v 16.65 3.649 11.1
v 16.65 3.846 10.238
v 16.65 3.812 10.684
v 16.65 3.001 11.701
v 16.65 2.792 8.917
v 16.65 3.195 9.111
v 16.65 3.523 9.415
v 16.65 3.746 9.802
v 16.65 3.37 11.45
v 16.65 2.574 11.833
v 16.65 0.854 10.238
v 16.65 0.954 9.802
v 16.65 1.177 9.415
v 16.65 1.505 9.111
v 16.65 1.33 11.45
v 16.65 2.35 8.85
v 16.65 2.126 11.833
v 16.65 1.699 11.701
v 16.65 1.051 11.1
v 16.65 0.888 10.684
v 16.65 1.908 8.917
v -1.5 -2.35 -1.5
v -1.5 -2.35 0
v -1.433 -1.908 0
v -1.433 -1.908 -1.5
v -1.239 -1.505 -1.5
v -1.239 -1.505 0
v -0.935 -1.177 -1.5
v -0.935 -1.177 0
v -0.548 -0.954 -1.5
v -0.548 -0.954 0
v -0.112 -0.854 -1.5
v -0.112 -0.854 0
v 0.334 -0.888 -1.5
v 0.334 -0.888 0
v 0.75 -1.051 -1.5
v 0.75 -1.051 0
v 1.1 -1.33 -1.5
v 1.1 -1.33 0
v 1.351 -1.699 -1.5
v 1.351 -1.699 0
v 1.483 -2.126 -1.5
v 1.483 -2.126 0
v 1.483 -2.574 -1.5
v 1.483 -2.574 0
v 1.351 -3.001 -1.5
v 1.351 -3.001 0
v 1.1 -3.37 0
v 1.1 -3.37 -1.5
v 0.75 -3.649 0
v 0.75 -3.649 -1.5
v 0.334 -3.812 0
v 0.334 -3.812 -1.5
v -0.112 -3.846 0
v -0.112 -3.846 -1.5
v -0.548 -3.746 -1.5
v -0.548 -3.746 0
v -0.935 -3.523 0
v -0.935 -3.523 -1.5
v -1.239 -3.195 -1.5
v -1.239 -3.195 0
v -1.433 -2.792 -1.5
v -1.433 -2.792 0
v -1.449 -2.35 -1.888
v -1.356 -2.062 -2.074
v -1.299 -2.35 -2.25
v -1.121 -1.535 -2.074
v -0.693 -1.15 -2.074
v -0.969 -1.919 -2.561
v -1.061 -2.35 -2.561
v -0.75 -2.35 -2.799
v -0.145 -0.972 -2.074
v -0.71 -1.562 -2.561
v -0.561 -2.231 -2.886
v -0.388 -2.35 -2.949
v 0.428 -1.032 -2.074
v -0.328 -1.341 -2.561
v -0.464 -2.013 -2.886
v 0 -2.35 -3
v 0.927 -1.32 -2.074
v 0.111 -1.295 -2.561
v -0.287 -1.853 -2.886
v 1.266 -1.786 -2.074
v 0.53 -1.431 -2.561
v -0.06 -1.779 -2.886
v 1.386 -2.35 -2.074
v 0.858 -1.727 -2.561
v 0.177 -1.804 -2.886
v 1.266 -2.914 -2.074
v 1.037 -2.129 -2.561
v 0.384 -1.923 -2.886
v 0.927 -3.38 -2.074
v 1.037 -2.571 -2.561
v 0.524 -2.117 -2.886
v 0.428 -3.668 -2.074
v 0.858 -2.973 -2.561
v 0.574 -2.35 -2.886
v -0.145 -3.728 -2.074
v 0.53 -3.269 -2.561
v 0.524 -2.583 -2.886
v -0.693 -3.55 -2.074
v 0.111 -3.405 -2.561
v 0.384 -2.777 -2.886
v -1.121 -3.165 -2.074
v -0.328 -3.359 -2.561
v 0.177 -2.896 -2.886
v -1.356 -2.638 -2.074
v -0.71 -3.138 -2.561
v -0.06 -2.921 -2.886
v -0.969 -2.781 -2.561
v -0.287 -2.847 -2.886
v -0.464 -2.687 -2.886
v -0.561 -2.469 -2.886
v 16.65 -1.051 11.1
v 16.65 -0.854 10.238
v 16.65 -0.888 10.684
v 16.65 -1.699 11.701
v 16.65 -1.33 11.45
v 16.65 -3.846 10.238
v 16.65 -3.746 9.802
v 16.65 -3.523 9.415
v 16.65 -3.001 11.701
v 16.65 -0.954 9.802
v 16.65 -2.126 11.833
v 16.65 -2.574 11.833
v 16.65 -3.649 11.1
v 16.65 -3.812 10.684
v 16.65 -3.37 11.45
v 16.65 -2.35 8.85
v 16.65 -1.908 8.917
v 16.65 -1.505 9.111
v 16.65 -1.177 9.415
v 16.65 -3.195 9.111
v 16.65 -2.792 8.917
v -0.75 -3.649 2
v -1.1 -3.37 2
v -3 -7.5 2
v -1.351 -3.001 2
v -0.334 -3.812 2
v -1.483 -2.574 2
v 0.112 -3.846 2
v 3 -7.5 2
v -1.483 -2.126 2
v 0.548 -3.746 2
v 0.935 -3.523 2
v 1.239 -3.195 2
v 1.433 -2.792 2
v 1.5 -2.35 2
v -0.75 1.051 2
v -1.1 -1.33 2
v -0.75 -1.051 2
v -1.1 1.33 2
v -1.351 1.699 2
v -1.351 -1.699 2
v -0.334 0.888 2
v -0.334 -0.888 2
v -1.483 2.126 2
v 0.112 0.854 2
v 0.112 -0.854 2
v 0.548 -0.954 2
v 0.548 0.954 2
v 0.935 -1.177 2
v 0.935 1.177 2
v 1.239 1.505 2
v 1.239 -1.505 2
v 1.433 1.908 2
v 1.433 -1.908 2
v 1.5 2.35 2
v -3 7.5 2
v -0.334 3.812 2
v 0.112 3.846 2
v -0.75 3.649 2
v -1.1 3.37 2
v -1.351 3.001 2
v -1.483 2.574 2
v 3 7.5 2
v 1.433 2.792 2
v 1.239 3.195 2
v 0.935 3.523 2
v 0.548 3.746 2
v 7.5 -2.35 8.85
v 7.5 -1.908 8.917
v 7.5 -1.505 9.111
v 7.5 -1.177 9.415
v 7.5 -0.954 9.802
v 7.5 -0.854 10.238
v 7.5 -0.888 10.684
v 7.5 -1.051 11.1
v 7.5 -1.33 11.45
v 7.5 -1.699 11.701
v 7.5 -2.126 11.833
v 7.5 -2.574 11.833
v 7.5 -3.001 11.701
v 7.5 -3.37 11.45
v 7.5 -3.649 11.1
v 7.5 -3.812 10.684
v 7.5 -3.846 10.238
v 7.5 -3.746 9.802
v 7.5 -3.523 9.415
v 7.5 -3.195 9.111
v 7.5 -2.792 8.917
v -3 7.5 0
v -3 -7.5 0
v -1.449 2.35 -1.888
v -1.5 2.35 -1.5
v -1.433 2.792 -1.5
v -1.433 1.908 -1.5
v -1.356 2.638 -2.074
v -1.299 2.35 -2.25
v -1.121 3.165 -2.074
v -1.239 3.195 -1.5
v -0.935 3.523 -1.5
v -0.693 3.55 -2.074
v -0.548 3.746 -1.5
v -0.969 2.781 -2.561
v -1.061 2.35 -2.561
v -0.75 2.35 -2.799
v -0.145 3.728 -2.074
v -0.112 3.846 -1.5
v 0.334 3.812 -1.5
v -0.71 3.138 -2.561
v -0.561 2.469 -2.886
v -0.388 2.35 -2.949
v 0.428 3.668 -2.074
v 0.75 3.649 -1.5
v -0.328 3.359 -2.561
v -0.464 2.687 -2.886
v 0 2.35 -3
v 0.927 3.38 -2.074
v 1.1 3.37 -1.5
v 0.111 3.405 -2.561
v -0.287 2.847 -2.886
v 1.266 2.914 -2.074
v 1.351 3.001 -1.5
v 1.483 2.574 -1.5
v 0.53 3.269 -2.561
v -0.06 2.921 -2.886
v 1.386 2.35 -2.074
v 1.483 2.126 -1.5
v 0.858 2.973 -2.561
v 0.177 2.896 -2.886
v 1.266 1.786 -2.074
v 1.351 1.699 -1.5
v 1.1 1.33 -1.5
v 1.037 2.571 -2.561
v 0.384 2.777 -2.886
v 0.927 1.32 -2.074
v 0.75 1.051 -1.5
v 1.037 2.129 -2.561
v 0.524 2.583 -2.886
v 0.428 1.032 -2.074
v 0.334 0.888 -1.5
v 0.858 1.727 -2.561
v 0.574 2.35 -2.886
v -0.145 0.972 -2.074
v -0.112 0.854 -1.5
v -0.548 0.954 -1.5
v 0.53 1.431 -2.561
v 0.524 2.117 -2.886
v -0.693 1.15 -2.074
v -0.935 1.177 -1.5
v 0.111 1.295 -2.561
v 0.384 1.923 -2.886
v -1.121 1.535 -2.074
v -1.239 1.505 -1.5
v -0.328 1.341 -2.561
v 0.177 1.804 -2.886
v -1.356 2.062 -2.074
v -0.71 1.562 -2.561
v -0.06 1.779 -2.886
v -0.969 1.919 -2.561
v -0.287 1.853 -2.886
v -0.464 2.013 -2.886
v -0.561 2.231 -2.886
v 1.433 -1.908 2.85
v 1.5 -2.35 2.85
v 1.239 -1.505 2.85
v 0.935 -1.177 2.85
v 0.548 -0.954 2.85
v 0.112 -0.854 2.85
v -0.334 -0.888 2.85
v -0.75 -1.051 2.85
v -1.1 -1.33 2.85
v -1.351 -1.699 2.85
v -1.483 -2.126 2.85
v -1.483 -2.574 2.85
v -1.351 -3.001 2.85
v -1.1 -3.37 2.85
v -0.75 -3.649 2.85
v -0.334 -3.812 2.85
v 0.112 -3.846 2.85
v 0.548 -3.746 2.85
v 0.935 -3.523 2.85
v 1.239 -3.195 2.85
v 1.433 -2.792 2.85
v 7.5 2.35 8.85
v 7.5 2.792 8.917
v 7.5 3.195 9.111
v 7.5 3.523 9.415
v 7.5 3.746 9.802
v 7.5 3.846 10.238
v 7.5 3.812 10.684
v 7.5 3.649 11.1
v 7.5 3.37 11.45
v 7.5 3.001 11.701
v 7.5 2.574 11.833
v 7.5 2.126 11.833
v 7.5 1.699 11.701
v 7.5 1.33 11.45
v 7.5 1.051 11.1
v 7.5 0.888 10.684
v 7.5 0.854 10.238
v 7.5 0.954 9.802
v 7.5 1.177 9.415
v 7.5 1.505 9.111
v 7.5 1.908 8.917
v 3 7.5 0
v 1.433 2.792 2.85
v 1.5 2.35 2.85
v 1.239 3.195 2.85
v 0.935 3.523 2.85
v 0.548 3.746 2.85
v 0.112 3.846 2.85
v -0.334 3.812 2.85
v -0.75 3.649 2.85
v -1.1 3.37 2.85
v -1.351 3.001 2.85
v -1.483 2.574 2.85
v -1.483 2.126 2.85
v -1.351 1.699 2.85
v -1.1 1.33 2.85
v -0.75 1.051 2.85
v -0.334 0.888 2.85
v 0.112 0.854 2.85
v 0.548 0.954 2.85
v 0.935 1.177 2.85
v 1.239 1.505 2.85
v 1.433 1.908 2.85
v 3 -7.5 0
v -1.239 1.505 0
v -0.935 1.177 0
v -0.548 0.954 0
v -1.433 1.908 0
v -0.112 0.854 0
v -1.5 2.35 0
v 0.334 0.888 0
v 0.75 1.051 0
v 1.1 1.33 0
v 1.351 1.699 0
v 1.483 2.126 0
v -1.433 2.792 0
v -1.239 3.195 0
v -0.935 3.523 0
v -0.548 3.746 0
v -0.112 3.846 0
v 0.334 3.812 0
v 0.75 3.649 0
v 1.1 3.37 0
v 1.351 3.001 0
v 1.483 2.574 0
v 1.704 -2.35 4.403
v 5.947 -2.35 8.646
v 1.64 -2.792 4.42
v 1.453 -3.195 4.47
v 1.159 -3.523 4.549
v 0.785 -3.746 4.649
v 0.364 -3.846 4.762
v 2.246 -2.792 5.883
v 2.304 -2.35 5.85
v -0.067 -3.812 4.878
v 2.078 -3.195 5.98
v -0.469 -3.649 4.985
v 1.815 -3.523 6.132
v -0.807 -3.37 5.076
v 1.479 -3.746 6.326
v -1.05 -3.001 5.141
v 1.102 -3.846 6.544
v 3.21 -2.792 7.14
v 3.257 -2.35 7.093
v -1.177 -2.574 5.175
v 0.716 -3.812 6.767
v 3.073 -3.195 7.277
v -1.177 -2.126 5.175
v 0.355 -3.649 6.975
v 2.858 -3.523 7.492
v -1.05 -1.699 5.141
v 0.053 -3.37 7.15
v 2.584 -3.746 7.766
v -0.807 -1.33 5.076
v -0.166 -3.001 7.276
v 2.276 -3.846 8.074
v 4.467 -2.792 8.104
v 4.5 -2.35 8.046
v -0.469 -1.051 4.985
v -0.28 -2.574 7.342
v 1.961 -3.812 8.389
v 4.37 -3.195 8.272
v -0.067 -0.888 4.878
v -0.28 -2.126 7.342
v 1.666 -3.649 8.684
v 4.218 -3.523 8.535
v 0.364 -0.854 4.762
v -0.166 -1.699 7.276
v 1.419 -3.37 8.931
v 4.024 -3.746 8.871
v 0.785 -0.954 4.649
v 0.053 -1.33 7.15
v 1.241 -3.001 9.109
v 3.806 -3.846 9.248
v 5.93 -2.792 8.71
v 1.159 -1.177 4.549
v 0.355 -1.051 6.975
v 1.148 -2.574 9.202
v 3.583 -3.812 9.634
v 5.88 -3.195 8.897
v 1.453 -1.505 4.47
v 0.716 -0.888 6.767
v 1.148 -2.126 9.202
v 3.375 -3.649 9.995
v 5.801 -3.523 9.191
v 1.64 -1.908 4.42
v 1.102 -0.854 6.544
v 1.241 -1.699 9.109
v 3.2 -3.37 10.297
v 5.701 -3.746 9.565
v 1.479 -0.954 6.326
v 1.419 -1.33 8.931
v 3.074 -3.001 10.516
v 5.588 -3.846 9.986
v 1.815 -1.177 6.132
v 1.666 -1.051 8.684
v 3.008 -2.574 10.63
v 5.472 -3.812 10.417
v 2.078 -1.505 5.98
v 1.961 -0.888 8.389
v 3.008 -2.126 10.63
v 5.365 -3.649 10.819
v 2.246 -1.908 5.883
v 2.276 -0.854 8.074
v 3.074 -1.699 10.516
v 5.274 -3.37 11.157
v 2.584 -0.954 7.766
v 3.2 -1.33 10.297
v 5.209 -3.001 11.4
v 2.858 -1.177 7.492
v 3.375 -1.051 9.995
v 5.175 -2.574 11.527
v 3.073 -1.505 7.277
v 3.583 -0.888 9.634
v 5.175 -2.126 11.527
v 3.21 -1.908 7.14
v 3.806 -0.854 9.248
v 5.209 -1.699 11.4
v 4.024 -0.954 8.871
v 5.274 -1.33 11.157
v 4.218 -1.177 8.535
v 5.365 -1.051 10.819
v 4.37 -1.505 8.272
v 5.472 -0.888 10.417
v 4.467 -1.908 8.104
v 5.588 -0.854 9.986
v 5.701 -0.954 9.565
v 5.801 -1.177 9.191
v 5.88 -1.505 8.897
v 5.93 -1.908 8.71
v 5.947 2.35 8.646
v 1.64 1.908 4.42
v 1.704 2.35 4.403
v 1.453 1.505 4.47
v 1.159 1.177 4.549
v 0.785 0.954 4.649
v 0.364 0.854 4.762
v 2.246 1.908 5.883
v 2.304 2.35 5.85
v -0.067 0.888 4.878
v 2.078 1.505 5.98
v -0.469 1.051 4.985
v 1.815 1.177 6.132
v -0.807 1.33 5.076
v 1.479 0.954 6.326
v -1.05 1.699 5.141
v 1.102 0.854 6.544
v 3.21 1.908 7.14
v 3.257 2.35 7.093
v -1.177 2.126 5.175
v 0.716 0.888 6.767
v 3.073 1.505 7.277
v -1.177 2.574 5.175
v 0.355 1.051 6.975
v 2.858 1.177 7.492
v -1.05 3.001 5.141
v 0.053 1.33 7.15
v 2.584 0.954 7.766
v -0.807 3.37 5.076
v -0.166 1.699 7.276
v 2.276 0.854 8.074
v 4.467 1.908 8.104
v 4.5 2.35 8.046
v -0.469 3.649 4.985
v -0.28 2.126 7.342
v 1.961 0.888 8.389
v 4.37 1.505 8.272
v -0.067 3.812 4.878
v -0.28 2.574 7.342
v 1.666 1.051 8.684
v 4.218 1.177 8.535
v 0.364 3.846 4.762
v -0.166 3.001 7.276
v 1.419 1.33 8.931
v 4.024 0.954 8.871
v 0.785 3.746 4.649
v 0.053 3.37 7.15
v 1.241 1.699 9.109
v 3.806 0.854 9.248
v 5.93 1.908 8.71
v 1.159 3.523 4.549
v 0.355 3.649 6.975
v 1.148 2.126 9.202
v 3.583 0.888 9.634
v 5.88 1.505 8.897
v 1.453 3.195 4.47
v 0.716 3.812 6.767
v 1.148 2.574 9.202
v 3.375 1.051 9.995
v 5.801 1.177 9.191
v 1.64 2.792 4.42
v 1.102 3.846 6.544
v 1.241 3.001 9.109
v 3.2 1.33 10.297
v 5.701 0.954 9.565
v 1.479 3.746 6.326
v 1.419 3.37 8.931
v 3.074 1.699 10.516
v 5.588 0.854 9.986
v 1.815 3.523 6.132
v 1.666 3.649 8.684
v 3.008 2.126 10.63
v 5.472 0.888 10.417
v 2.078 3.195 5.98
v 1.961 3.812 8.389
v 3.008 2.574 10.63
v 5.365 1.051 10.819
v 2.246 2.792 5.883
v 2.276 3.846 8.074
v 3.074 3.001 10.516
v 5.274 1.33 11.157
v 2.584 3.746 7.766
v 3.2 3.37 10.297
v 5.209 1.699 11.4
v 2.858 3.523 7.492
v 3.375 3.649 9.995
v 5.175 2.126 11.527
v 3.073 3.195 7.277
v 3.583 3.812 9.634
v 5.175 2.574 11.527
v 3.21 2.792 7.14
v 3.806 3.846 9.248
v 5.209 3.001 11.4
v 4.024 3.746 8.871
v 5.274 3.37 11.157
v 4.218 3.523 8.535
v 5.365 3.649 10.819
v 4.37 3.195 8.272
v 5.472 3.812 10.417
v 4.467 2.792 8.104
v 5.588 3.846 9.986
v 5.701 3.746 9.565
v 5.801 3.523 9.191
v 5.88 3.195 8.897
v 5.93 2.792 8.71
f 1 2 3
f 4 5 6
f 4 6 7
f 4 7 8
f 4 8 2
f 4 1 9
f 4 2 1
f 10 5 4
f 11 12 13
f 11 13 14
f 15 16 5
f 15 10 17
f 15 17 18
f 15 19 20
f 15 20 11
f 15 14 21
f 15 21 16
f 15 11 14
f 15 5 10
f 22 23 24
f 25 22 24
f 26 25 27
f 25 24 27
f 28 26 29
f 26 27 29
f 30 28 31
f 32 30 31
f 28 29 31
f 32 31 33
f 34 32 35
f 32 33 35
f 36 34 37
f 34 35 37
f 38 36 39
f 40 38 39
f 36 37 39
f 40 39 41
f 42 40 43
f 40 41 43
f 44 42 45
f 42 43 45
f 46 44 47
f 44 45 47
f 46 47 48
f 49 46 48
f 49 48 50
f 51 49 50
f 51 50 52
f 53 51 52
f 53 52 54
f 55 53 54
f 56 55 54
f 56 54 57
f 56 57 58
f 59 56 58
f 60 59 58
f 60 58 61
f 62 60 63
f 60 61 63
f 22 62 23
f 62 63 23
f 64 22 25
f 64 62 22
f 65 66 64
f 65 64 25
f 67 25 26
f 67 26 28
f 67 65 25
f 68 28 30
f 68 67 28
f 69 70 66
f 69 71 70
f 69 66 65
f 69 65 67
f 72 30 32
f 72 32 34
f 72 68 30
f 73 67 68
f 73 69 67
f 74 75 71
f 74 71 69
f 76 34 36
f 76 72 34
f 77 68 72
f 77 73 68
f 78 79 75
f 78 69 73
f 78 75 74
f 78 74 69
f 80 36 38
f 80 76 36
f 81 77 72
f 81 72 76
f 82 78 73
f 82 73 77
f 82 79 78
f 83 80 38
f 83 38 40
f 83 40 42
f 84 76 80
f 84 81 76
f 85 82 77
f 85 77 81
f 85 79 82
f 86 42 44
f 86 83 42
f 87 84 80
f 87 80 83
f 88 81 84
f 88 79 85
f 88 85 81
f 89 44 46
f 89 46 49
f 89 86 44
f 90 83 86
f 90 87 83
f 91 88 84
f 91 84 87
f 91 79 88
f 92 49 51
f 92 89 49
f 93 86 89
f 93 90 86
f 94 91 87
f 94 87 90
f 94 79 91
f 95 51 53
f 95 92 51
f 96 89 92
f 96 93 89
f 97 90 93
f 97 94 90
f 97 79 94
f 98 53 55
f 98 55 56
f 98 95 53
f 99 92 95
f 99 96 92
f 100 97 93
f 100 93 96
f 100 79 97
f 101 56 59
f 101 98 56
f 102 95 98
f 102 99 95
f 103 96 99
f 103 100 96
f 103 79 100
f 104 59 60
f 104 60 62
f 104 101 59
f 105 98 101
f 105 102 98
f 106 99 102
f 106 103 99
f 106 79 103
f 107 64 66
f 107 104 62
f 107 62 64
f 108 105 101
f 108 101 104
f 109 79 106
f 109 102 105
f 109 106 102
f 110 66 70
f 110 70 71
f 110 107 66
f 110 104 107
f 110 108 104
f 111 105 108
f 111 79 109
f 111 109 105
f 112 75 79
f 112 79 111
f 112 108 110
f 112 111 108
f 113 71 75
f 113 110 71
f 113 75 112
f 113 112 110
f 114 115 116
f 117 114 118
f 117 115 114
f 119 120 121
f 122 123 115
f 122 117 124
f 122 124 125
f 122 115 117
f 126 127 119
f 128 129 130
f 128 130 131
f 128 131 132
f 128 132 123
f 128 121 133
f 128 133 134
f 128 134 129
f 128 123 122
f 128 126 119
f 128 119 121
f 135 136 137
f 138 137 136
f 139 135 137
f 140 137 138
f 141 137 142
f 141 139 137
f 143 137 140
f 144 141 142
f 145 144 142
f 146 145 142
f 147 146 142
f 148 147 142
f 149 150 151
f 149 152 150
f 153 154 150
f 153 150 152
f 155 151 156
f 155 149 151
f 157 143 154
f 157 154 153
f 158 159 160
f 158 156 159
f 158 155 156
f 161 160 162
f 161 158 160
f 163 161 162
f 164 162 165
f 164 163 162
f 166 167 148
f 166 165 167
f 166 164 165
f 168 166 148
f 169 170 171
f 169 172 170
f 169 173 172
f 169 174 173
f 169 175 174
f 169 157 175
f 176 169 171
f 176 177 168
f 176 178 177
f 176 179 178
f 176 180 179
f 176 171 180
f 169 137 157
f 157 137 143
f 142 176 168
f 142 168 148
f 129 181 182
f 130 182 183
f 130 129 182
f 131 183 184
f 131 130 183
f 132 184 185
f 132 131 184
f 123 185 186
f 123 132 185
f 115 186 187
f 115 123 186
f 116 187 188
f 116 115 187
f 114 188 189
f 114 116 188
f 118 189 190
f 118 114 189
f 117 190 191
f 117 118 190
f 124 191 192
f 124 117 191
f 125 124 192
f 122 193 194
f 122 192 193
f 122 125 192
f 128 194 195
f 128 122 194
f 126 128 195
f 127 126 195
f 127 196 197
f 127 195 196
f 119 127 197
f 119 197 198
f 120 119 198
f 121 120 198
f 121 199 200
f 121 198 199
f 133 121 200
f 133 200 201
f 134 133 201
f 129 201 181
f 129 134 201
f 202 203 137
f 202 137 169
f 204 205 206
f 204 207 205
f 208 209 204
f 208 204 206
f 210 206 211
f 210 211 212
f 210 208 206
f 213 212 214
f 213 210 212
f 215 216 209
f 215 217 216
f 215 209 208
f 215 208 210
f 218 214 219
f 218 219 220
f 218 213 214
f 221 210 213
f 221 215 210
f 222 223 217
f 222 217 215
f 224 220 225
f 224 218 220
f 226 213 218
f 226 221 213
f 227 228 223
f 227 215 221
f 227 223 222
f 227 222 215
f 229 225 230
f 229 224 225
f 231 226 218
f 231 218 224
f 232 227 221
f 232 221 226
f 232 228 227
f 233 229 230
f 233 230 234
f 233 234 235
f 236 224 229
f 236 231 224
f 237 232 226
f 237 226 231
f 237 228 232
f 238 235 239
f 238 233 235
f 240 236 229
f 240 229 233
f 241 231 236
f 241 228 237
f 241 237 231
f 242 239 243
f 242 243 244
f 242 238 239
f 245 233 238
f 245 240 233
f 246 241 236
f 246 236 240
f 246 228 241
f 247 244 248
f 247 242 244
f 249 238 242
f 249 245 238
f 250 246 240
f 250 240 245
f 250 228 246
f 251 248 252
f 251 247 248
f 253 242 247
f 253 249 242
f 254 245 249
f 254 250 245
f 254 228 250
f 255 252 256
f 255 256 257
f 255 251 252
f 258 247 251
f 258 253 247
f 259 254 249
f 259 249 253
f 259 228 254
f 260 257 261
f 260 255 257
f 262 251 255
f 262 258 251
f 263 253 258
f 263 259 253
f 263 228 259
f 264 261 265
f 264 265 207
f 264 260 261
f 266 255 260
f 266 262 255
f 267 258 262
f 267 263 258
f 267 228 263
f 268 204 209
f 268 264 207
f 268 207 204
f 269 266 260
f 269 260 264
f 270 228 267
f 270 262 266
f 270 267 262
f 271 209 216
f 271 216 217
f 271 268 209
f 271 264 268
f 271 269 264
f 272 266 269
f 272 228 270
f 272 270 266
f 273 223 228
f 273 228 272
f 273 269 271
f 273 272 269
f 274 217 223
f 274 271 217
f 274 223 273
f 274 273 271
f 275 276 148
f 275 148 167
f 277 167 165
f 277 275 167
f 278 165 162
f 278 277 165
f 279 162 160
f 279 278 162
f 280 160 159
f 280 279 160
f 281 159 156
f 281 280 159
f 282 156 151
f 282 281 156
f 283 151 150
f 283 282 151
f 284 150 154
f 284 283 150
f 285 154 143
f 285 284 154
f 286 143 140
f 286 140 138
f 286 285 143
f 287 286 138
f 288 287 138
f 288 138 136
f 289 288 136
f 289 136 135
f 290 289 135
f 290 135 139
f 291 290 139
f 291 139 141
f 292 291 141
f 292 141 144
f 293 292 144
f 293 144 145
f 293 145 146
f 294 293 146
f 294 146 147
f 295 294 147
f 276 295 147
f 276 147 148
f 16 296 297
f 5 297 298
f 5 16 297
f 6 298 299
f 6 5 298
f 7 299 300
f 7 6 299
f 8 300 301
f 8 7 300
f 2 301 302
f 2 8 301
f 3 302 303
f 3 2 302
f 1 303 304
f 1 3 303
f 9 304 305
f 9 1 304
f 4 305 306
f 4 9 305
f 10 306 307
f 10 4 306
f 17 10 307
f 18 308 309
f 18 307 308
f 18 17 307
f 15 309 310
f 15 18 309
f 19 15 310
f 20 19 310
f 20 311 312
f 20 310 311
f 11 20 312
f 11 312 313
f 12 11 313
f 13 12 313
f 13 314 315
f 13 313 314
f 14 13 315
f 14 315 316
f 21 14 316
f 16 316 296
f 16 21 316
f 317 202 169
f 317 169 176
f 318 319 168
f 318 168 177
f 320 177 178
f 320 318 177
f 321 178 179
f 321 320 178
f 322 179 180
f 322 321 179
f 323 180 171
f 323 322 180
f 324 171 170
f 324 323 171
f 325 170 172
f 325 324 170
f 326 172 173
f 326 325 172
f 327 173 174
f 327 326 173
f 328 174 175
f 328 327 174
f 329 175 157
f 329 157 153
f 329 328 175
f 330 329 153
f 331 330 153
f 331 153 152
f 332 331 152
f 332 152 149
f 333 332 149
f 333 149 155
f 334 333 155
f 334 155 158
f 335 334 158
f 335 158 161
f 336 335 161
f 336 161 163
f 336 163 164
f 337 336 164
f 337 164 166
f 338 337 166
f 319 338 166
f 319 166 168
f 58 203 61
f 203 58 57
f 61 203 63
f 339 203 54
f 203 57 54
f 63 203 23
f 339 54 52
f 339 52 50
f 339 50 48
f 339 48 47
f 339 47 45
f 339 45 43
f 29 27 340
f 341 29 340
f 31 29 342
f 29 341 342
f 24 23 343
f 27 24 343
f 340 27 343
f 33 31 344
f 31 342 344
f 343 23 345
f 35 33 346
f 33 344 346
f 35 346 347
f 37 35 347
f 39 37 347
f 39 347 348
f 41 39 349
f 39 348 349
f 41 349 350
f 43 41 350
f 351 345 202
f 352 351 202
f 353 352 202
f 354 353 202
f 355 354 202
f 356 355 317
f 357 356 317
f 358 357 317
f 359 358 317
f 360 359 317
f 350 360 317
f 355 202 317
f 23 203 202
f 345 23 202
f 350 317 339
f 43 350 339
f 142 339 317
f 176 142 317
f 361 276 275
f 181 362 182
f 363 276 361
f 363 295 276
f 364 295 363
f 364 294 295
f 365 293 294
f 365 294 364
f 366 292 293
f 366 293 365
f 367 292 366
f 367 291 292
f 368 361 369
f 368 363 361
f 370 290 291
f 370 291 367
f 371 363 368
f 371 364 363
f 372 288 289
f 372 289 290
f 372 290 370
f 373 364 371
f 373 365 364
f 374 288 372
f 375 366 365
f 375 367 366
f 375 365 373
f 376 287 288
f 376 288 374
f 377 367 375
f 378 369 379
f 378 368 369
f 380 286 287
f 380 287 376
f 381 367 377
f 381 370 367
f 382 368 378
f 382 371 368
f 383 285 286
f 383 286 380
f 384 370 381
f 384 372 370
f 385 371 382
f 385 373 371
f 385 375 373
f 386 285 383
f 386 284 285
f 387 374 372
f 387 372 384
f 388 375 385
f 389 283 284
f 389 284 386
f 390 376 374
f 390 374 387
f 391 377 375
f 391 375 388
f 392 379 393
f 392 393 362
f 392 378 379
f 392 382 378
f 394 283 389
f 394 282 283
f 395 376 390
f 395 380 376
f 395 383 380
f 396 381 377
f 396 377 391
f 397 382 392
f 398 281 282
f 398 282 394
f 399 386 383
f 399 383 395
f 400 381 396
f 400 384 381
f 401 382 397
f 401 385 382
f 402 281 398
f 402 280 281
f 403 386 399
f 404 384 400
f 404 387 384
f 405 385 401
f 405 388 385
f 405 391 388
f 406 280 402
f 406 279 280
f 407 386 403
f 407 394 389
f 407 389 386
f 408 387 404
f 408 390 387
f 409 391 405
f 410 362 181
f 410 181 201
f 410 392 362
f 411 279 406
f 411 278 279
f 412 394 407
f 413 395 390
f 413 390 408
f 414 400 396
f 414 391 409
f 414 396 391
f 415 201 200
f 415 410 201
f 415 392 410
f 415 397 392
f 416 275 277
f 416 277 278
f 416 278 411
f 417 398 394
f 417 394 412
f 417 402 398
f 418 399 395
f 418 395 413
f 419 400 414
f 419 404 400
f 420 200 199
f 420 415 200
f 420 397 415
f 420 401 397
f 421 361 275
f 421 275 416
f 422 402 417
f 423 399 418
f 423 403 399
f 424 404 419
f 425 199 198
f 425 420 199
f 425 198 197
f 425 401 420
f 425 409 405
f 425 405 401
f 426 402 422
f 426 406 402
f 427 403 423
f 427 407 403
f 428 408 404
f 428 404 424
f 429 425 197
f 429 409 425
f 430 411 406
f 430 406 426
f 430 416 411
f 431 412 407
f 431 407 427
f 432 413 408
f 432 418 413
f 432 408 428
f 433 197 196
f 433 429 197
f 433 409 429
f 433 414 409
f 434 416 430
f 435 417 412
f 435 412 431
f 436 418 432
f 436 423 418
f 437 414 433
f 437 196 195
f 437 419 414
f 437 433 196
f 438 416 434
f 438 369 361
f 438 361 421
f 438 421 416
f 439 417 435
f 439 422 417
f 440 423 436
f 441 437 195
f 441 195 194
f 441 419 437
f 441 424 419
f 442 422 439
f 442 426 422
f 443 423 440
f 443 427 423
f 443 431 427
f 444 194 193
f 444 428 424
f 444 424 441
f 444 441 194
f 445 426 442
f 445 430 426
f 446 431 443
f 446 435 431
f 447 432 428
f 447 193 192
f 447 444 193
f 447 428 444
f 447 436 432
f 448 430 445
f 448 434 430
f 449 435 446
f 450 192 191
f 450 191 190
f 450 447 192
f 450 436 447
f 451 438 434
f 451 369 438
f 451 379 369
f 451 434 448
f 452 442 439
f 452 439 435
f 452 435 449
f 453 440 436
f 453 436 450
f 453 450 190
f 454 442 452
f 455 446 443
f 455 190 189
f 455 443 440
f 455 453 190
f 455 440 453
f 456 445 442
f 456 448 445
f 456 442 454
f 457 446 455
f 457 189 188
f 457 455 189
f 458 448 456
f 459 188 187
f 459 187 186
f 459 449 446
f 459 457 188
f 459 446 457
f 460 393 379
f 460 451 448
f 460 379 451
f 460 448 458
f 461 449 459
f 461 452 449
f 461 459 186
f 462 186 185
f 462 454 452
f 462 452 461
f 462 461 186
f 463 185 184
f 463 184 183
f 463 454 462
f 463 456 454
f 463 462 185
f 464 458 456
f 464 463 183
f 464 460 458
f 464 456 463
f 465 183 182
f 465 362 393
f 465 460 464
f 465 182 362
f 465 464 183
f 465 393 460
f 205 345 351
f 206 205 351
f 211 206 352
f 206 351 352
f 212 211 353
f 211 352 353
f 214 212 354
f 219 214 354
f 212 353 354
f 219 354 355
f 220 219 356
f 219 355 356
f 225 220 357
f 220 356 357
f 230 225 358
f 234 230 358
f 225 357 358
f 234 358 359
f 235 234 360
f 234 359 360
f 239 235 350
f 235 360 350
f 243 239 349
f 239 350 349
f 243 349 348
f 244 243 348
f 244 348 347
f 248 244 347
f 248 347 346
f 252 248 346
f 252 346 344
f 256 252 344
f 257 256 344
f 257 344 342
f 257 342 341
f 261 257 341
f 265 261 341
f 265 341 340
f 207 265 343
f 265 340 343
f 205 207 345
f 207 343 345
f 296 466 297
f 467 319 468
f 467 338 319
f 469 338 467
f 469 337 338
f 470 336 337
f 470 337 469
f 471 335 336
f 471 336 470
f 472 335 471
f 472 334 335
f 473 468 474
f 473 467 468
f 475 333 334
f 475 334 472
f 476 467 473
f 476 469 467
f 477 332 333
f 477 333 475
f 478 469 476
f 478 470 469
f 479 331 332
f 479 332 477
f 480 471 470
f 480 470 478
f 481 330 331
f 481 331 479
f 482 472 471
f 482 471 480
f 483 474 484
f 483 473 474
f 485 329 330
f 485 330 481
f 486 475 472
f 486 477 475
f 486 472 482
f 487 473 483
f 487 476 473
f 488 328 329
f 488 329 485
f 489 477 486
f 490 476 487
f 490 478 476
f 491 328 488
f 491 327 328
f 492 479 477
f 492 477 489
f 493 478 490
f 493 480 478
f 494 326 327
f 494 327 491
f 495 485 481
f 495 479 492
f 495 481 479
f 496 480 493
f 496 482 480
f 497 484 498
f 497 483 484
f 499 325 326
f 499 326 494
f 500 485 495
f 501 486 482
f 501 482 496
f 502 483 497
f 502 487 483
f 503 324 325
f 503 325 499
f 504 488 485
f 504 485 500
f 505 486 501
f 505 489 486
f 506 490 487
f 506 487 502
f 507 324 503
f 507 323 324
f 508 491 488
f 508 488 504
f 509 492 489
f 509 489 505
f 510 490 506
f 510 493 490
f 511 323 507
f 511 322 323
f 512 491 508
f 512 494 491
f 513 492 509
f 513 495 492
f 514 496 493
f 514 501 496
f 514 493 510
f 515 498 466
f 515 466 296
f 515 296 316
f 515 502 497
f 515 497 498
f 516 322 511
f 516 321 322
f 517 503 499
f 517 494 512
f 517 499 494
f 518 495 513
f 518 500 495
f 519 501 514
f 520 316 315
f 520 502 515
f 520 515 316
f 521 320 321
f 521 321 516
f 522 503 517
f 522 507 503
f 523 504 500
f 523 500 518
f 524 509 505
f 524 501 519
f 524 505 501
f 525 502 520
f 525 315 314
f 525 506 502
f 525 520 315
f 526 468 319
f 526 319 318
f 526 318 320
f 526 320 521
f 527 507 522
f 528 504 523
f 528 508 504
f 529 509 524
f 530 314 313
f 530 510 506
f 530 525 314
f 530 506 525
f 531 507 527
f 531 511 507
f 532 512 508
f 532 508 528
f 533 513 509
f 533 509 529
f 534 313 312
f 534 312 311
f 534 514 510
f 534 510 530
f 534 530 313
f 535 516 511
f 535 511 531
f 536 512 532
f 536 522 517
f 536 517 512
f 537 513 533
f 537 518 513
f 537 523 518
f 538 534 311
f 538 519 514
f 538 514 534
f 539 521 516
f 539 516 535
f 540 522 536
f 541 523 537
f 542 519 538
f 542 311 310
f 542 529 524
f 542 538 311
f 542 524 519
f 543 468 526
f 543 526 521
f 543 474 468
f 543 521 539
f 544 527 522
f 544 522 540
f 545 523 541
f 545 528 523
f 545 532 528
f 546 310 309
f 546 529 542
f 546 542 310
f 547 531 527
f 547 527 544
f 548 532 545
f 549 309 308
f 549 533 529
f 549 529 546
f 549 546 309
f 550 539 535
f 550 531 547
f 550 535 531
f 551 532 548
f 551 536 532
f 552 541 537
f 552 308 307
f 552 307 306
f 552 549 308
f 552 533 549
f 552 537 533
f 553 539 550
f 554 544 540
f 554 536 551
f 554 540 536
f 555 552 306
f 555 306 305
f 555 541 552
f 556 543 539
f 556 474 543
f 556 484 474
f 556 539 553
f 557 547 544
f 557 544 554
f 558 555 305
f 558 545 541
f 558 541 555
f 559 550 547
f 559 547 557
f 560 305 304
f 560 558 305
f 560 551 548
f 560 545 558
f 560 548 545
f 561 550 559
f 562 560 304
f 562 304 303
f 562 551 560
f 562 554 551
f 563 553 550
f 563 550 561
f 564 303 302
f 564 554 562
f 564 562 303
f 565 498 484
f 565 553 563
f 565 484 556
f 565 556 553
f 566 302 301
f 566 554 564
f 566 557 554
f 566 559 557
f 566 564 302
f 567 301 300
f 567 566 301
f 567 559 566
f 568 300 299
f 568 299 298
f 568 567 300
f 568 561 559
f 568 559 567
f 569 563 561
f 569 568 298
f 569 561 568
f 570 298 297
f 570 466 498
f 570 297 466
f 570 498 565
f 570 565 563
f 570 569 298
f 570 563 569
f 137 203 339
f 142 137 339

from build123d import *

# Parameters (mm, degrees)
SKETCH1_W           = 6
SKETCH1_H           = 15
BOSS_EXTRUDE1_DEPTH = 2
SKETCH2_R           = 1.5
BOSS_EXTRUDE2_DEPTH = 3
FILLET1_R           = 1.5
SKETCH3_R           = 1.5


with BuildPart() as part:
    # Sketch1 → Boss-Extrude1 (new body)
    with BuildSketch(Plane.XY):
        Rectangle(SKETCH1_W, SKETCH1_H)
    extrude(amount=BOSS_EXTRUDE1_DEPTH)

    # Sketch2 → Boss-Extrude2 (add)
    with BuildSketch(Plane(origin=(0, 0, 0), x_dir=(-1, 0, 0), z_dir=(0, 0, -1))):
        with Locations((0, 2.35)):
            Circle(SKETCH2_R)
        with Locations((0, -2.35)):
            Circle(SKETCH2_R)
    extrude(amount=BOSS_EXTRUDE2_DEPTH)

    # Fillet1
    fillet1_edges = [part.edges().sort_by_distance(p)[0] for p in [
        (1.5, 2.35, -3),
        (1.5, -2.35, -3),
    ]]
    fillet(fillet1_edges, radius=FILLET1_R)

    # Sweep1: sweep along a path in Sketch4
    with BuildLine(Plane(origin=(0, 2.35, 0), x_dir=(-1, 0, 0), z_dir=(0, 1, 0))) as sweep1_path:
        Line((0, 2), (0, 2.85))
        ThreePointArc((0, 2.85), (-2.196699141, 8.153300859), (-7.5, 10.35))
        Line((-7.5, 10.35), (-16.65, 10.35))
    # Sketch3 → Sweep1 (sweep)
    with BuildSketch(Plane.XY.offset(2)):
        with Locations((0, -2.35)):
            Circle(SKETCH3_R)
        with Locations((0, 2.35)):
            Circle(SKETCH3_R)
    sweep(path=sweep1_path.line)


solid = part.part
